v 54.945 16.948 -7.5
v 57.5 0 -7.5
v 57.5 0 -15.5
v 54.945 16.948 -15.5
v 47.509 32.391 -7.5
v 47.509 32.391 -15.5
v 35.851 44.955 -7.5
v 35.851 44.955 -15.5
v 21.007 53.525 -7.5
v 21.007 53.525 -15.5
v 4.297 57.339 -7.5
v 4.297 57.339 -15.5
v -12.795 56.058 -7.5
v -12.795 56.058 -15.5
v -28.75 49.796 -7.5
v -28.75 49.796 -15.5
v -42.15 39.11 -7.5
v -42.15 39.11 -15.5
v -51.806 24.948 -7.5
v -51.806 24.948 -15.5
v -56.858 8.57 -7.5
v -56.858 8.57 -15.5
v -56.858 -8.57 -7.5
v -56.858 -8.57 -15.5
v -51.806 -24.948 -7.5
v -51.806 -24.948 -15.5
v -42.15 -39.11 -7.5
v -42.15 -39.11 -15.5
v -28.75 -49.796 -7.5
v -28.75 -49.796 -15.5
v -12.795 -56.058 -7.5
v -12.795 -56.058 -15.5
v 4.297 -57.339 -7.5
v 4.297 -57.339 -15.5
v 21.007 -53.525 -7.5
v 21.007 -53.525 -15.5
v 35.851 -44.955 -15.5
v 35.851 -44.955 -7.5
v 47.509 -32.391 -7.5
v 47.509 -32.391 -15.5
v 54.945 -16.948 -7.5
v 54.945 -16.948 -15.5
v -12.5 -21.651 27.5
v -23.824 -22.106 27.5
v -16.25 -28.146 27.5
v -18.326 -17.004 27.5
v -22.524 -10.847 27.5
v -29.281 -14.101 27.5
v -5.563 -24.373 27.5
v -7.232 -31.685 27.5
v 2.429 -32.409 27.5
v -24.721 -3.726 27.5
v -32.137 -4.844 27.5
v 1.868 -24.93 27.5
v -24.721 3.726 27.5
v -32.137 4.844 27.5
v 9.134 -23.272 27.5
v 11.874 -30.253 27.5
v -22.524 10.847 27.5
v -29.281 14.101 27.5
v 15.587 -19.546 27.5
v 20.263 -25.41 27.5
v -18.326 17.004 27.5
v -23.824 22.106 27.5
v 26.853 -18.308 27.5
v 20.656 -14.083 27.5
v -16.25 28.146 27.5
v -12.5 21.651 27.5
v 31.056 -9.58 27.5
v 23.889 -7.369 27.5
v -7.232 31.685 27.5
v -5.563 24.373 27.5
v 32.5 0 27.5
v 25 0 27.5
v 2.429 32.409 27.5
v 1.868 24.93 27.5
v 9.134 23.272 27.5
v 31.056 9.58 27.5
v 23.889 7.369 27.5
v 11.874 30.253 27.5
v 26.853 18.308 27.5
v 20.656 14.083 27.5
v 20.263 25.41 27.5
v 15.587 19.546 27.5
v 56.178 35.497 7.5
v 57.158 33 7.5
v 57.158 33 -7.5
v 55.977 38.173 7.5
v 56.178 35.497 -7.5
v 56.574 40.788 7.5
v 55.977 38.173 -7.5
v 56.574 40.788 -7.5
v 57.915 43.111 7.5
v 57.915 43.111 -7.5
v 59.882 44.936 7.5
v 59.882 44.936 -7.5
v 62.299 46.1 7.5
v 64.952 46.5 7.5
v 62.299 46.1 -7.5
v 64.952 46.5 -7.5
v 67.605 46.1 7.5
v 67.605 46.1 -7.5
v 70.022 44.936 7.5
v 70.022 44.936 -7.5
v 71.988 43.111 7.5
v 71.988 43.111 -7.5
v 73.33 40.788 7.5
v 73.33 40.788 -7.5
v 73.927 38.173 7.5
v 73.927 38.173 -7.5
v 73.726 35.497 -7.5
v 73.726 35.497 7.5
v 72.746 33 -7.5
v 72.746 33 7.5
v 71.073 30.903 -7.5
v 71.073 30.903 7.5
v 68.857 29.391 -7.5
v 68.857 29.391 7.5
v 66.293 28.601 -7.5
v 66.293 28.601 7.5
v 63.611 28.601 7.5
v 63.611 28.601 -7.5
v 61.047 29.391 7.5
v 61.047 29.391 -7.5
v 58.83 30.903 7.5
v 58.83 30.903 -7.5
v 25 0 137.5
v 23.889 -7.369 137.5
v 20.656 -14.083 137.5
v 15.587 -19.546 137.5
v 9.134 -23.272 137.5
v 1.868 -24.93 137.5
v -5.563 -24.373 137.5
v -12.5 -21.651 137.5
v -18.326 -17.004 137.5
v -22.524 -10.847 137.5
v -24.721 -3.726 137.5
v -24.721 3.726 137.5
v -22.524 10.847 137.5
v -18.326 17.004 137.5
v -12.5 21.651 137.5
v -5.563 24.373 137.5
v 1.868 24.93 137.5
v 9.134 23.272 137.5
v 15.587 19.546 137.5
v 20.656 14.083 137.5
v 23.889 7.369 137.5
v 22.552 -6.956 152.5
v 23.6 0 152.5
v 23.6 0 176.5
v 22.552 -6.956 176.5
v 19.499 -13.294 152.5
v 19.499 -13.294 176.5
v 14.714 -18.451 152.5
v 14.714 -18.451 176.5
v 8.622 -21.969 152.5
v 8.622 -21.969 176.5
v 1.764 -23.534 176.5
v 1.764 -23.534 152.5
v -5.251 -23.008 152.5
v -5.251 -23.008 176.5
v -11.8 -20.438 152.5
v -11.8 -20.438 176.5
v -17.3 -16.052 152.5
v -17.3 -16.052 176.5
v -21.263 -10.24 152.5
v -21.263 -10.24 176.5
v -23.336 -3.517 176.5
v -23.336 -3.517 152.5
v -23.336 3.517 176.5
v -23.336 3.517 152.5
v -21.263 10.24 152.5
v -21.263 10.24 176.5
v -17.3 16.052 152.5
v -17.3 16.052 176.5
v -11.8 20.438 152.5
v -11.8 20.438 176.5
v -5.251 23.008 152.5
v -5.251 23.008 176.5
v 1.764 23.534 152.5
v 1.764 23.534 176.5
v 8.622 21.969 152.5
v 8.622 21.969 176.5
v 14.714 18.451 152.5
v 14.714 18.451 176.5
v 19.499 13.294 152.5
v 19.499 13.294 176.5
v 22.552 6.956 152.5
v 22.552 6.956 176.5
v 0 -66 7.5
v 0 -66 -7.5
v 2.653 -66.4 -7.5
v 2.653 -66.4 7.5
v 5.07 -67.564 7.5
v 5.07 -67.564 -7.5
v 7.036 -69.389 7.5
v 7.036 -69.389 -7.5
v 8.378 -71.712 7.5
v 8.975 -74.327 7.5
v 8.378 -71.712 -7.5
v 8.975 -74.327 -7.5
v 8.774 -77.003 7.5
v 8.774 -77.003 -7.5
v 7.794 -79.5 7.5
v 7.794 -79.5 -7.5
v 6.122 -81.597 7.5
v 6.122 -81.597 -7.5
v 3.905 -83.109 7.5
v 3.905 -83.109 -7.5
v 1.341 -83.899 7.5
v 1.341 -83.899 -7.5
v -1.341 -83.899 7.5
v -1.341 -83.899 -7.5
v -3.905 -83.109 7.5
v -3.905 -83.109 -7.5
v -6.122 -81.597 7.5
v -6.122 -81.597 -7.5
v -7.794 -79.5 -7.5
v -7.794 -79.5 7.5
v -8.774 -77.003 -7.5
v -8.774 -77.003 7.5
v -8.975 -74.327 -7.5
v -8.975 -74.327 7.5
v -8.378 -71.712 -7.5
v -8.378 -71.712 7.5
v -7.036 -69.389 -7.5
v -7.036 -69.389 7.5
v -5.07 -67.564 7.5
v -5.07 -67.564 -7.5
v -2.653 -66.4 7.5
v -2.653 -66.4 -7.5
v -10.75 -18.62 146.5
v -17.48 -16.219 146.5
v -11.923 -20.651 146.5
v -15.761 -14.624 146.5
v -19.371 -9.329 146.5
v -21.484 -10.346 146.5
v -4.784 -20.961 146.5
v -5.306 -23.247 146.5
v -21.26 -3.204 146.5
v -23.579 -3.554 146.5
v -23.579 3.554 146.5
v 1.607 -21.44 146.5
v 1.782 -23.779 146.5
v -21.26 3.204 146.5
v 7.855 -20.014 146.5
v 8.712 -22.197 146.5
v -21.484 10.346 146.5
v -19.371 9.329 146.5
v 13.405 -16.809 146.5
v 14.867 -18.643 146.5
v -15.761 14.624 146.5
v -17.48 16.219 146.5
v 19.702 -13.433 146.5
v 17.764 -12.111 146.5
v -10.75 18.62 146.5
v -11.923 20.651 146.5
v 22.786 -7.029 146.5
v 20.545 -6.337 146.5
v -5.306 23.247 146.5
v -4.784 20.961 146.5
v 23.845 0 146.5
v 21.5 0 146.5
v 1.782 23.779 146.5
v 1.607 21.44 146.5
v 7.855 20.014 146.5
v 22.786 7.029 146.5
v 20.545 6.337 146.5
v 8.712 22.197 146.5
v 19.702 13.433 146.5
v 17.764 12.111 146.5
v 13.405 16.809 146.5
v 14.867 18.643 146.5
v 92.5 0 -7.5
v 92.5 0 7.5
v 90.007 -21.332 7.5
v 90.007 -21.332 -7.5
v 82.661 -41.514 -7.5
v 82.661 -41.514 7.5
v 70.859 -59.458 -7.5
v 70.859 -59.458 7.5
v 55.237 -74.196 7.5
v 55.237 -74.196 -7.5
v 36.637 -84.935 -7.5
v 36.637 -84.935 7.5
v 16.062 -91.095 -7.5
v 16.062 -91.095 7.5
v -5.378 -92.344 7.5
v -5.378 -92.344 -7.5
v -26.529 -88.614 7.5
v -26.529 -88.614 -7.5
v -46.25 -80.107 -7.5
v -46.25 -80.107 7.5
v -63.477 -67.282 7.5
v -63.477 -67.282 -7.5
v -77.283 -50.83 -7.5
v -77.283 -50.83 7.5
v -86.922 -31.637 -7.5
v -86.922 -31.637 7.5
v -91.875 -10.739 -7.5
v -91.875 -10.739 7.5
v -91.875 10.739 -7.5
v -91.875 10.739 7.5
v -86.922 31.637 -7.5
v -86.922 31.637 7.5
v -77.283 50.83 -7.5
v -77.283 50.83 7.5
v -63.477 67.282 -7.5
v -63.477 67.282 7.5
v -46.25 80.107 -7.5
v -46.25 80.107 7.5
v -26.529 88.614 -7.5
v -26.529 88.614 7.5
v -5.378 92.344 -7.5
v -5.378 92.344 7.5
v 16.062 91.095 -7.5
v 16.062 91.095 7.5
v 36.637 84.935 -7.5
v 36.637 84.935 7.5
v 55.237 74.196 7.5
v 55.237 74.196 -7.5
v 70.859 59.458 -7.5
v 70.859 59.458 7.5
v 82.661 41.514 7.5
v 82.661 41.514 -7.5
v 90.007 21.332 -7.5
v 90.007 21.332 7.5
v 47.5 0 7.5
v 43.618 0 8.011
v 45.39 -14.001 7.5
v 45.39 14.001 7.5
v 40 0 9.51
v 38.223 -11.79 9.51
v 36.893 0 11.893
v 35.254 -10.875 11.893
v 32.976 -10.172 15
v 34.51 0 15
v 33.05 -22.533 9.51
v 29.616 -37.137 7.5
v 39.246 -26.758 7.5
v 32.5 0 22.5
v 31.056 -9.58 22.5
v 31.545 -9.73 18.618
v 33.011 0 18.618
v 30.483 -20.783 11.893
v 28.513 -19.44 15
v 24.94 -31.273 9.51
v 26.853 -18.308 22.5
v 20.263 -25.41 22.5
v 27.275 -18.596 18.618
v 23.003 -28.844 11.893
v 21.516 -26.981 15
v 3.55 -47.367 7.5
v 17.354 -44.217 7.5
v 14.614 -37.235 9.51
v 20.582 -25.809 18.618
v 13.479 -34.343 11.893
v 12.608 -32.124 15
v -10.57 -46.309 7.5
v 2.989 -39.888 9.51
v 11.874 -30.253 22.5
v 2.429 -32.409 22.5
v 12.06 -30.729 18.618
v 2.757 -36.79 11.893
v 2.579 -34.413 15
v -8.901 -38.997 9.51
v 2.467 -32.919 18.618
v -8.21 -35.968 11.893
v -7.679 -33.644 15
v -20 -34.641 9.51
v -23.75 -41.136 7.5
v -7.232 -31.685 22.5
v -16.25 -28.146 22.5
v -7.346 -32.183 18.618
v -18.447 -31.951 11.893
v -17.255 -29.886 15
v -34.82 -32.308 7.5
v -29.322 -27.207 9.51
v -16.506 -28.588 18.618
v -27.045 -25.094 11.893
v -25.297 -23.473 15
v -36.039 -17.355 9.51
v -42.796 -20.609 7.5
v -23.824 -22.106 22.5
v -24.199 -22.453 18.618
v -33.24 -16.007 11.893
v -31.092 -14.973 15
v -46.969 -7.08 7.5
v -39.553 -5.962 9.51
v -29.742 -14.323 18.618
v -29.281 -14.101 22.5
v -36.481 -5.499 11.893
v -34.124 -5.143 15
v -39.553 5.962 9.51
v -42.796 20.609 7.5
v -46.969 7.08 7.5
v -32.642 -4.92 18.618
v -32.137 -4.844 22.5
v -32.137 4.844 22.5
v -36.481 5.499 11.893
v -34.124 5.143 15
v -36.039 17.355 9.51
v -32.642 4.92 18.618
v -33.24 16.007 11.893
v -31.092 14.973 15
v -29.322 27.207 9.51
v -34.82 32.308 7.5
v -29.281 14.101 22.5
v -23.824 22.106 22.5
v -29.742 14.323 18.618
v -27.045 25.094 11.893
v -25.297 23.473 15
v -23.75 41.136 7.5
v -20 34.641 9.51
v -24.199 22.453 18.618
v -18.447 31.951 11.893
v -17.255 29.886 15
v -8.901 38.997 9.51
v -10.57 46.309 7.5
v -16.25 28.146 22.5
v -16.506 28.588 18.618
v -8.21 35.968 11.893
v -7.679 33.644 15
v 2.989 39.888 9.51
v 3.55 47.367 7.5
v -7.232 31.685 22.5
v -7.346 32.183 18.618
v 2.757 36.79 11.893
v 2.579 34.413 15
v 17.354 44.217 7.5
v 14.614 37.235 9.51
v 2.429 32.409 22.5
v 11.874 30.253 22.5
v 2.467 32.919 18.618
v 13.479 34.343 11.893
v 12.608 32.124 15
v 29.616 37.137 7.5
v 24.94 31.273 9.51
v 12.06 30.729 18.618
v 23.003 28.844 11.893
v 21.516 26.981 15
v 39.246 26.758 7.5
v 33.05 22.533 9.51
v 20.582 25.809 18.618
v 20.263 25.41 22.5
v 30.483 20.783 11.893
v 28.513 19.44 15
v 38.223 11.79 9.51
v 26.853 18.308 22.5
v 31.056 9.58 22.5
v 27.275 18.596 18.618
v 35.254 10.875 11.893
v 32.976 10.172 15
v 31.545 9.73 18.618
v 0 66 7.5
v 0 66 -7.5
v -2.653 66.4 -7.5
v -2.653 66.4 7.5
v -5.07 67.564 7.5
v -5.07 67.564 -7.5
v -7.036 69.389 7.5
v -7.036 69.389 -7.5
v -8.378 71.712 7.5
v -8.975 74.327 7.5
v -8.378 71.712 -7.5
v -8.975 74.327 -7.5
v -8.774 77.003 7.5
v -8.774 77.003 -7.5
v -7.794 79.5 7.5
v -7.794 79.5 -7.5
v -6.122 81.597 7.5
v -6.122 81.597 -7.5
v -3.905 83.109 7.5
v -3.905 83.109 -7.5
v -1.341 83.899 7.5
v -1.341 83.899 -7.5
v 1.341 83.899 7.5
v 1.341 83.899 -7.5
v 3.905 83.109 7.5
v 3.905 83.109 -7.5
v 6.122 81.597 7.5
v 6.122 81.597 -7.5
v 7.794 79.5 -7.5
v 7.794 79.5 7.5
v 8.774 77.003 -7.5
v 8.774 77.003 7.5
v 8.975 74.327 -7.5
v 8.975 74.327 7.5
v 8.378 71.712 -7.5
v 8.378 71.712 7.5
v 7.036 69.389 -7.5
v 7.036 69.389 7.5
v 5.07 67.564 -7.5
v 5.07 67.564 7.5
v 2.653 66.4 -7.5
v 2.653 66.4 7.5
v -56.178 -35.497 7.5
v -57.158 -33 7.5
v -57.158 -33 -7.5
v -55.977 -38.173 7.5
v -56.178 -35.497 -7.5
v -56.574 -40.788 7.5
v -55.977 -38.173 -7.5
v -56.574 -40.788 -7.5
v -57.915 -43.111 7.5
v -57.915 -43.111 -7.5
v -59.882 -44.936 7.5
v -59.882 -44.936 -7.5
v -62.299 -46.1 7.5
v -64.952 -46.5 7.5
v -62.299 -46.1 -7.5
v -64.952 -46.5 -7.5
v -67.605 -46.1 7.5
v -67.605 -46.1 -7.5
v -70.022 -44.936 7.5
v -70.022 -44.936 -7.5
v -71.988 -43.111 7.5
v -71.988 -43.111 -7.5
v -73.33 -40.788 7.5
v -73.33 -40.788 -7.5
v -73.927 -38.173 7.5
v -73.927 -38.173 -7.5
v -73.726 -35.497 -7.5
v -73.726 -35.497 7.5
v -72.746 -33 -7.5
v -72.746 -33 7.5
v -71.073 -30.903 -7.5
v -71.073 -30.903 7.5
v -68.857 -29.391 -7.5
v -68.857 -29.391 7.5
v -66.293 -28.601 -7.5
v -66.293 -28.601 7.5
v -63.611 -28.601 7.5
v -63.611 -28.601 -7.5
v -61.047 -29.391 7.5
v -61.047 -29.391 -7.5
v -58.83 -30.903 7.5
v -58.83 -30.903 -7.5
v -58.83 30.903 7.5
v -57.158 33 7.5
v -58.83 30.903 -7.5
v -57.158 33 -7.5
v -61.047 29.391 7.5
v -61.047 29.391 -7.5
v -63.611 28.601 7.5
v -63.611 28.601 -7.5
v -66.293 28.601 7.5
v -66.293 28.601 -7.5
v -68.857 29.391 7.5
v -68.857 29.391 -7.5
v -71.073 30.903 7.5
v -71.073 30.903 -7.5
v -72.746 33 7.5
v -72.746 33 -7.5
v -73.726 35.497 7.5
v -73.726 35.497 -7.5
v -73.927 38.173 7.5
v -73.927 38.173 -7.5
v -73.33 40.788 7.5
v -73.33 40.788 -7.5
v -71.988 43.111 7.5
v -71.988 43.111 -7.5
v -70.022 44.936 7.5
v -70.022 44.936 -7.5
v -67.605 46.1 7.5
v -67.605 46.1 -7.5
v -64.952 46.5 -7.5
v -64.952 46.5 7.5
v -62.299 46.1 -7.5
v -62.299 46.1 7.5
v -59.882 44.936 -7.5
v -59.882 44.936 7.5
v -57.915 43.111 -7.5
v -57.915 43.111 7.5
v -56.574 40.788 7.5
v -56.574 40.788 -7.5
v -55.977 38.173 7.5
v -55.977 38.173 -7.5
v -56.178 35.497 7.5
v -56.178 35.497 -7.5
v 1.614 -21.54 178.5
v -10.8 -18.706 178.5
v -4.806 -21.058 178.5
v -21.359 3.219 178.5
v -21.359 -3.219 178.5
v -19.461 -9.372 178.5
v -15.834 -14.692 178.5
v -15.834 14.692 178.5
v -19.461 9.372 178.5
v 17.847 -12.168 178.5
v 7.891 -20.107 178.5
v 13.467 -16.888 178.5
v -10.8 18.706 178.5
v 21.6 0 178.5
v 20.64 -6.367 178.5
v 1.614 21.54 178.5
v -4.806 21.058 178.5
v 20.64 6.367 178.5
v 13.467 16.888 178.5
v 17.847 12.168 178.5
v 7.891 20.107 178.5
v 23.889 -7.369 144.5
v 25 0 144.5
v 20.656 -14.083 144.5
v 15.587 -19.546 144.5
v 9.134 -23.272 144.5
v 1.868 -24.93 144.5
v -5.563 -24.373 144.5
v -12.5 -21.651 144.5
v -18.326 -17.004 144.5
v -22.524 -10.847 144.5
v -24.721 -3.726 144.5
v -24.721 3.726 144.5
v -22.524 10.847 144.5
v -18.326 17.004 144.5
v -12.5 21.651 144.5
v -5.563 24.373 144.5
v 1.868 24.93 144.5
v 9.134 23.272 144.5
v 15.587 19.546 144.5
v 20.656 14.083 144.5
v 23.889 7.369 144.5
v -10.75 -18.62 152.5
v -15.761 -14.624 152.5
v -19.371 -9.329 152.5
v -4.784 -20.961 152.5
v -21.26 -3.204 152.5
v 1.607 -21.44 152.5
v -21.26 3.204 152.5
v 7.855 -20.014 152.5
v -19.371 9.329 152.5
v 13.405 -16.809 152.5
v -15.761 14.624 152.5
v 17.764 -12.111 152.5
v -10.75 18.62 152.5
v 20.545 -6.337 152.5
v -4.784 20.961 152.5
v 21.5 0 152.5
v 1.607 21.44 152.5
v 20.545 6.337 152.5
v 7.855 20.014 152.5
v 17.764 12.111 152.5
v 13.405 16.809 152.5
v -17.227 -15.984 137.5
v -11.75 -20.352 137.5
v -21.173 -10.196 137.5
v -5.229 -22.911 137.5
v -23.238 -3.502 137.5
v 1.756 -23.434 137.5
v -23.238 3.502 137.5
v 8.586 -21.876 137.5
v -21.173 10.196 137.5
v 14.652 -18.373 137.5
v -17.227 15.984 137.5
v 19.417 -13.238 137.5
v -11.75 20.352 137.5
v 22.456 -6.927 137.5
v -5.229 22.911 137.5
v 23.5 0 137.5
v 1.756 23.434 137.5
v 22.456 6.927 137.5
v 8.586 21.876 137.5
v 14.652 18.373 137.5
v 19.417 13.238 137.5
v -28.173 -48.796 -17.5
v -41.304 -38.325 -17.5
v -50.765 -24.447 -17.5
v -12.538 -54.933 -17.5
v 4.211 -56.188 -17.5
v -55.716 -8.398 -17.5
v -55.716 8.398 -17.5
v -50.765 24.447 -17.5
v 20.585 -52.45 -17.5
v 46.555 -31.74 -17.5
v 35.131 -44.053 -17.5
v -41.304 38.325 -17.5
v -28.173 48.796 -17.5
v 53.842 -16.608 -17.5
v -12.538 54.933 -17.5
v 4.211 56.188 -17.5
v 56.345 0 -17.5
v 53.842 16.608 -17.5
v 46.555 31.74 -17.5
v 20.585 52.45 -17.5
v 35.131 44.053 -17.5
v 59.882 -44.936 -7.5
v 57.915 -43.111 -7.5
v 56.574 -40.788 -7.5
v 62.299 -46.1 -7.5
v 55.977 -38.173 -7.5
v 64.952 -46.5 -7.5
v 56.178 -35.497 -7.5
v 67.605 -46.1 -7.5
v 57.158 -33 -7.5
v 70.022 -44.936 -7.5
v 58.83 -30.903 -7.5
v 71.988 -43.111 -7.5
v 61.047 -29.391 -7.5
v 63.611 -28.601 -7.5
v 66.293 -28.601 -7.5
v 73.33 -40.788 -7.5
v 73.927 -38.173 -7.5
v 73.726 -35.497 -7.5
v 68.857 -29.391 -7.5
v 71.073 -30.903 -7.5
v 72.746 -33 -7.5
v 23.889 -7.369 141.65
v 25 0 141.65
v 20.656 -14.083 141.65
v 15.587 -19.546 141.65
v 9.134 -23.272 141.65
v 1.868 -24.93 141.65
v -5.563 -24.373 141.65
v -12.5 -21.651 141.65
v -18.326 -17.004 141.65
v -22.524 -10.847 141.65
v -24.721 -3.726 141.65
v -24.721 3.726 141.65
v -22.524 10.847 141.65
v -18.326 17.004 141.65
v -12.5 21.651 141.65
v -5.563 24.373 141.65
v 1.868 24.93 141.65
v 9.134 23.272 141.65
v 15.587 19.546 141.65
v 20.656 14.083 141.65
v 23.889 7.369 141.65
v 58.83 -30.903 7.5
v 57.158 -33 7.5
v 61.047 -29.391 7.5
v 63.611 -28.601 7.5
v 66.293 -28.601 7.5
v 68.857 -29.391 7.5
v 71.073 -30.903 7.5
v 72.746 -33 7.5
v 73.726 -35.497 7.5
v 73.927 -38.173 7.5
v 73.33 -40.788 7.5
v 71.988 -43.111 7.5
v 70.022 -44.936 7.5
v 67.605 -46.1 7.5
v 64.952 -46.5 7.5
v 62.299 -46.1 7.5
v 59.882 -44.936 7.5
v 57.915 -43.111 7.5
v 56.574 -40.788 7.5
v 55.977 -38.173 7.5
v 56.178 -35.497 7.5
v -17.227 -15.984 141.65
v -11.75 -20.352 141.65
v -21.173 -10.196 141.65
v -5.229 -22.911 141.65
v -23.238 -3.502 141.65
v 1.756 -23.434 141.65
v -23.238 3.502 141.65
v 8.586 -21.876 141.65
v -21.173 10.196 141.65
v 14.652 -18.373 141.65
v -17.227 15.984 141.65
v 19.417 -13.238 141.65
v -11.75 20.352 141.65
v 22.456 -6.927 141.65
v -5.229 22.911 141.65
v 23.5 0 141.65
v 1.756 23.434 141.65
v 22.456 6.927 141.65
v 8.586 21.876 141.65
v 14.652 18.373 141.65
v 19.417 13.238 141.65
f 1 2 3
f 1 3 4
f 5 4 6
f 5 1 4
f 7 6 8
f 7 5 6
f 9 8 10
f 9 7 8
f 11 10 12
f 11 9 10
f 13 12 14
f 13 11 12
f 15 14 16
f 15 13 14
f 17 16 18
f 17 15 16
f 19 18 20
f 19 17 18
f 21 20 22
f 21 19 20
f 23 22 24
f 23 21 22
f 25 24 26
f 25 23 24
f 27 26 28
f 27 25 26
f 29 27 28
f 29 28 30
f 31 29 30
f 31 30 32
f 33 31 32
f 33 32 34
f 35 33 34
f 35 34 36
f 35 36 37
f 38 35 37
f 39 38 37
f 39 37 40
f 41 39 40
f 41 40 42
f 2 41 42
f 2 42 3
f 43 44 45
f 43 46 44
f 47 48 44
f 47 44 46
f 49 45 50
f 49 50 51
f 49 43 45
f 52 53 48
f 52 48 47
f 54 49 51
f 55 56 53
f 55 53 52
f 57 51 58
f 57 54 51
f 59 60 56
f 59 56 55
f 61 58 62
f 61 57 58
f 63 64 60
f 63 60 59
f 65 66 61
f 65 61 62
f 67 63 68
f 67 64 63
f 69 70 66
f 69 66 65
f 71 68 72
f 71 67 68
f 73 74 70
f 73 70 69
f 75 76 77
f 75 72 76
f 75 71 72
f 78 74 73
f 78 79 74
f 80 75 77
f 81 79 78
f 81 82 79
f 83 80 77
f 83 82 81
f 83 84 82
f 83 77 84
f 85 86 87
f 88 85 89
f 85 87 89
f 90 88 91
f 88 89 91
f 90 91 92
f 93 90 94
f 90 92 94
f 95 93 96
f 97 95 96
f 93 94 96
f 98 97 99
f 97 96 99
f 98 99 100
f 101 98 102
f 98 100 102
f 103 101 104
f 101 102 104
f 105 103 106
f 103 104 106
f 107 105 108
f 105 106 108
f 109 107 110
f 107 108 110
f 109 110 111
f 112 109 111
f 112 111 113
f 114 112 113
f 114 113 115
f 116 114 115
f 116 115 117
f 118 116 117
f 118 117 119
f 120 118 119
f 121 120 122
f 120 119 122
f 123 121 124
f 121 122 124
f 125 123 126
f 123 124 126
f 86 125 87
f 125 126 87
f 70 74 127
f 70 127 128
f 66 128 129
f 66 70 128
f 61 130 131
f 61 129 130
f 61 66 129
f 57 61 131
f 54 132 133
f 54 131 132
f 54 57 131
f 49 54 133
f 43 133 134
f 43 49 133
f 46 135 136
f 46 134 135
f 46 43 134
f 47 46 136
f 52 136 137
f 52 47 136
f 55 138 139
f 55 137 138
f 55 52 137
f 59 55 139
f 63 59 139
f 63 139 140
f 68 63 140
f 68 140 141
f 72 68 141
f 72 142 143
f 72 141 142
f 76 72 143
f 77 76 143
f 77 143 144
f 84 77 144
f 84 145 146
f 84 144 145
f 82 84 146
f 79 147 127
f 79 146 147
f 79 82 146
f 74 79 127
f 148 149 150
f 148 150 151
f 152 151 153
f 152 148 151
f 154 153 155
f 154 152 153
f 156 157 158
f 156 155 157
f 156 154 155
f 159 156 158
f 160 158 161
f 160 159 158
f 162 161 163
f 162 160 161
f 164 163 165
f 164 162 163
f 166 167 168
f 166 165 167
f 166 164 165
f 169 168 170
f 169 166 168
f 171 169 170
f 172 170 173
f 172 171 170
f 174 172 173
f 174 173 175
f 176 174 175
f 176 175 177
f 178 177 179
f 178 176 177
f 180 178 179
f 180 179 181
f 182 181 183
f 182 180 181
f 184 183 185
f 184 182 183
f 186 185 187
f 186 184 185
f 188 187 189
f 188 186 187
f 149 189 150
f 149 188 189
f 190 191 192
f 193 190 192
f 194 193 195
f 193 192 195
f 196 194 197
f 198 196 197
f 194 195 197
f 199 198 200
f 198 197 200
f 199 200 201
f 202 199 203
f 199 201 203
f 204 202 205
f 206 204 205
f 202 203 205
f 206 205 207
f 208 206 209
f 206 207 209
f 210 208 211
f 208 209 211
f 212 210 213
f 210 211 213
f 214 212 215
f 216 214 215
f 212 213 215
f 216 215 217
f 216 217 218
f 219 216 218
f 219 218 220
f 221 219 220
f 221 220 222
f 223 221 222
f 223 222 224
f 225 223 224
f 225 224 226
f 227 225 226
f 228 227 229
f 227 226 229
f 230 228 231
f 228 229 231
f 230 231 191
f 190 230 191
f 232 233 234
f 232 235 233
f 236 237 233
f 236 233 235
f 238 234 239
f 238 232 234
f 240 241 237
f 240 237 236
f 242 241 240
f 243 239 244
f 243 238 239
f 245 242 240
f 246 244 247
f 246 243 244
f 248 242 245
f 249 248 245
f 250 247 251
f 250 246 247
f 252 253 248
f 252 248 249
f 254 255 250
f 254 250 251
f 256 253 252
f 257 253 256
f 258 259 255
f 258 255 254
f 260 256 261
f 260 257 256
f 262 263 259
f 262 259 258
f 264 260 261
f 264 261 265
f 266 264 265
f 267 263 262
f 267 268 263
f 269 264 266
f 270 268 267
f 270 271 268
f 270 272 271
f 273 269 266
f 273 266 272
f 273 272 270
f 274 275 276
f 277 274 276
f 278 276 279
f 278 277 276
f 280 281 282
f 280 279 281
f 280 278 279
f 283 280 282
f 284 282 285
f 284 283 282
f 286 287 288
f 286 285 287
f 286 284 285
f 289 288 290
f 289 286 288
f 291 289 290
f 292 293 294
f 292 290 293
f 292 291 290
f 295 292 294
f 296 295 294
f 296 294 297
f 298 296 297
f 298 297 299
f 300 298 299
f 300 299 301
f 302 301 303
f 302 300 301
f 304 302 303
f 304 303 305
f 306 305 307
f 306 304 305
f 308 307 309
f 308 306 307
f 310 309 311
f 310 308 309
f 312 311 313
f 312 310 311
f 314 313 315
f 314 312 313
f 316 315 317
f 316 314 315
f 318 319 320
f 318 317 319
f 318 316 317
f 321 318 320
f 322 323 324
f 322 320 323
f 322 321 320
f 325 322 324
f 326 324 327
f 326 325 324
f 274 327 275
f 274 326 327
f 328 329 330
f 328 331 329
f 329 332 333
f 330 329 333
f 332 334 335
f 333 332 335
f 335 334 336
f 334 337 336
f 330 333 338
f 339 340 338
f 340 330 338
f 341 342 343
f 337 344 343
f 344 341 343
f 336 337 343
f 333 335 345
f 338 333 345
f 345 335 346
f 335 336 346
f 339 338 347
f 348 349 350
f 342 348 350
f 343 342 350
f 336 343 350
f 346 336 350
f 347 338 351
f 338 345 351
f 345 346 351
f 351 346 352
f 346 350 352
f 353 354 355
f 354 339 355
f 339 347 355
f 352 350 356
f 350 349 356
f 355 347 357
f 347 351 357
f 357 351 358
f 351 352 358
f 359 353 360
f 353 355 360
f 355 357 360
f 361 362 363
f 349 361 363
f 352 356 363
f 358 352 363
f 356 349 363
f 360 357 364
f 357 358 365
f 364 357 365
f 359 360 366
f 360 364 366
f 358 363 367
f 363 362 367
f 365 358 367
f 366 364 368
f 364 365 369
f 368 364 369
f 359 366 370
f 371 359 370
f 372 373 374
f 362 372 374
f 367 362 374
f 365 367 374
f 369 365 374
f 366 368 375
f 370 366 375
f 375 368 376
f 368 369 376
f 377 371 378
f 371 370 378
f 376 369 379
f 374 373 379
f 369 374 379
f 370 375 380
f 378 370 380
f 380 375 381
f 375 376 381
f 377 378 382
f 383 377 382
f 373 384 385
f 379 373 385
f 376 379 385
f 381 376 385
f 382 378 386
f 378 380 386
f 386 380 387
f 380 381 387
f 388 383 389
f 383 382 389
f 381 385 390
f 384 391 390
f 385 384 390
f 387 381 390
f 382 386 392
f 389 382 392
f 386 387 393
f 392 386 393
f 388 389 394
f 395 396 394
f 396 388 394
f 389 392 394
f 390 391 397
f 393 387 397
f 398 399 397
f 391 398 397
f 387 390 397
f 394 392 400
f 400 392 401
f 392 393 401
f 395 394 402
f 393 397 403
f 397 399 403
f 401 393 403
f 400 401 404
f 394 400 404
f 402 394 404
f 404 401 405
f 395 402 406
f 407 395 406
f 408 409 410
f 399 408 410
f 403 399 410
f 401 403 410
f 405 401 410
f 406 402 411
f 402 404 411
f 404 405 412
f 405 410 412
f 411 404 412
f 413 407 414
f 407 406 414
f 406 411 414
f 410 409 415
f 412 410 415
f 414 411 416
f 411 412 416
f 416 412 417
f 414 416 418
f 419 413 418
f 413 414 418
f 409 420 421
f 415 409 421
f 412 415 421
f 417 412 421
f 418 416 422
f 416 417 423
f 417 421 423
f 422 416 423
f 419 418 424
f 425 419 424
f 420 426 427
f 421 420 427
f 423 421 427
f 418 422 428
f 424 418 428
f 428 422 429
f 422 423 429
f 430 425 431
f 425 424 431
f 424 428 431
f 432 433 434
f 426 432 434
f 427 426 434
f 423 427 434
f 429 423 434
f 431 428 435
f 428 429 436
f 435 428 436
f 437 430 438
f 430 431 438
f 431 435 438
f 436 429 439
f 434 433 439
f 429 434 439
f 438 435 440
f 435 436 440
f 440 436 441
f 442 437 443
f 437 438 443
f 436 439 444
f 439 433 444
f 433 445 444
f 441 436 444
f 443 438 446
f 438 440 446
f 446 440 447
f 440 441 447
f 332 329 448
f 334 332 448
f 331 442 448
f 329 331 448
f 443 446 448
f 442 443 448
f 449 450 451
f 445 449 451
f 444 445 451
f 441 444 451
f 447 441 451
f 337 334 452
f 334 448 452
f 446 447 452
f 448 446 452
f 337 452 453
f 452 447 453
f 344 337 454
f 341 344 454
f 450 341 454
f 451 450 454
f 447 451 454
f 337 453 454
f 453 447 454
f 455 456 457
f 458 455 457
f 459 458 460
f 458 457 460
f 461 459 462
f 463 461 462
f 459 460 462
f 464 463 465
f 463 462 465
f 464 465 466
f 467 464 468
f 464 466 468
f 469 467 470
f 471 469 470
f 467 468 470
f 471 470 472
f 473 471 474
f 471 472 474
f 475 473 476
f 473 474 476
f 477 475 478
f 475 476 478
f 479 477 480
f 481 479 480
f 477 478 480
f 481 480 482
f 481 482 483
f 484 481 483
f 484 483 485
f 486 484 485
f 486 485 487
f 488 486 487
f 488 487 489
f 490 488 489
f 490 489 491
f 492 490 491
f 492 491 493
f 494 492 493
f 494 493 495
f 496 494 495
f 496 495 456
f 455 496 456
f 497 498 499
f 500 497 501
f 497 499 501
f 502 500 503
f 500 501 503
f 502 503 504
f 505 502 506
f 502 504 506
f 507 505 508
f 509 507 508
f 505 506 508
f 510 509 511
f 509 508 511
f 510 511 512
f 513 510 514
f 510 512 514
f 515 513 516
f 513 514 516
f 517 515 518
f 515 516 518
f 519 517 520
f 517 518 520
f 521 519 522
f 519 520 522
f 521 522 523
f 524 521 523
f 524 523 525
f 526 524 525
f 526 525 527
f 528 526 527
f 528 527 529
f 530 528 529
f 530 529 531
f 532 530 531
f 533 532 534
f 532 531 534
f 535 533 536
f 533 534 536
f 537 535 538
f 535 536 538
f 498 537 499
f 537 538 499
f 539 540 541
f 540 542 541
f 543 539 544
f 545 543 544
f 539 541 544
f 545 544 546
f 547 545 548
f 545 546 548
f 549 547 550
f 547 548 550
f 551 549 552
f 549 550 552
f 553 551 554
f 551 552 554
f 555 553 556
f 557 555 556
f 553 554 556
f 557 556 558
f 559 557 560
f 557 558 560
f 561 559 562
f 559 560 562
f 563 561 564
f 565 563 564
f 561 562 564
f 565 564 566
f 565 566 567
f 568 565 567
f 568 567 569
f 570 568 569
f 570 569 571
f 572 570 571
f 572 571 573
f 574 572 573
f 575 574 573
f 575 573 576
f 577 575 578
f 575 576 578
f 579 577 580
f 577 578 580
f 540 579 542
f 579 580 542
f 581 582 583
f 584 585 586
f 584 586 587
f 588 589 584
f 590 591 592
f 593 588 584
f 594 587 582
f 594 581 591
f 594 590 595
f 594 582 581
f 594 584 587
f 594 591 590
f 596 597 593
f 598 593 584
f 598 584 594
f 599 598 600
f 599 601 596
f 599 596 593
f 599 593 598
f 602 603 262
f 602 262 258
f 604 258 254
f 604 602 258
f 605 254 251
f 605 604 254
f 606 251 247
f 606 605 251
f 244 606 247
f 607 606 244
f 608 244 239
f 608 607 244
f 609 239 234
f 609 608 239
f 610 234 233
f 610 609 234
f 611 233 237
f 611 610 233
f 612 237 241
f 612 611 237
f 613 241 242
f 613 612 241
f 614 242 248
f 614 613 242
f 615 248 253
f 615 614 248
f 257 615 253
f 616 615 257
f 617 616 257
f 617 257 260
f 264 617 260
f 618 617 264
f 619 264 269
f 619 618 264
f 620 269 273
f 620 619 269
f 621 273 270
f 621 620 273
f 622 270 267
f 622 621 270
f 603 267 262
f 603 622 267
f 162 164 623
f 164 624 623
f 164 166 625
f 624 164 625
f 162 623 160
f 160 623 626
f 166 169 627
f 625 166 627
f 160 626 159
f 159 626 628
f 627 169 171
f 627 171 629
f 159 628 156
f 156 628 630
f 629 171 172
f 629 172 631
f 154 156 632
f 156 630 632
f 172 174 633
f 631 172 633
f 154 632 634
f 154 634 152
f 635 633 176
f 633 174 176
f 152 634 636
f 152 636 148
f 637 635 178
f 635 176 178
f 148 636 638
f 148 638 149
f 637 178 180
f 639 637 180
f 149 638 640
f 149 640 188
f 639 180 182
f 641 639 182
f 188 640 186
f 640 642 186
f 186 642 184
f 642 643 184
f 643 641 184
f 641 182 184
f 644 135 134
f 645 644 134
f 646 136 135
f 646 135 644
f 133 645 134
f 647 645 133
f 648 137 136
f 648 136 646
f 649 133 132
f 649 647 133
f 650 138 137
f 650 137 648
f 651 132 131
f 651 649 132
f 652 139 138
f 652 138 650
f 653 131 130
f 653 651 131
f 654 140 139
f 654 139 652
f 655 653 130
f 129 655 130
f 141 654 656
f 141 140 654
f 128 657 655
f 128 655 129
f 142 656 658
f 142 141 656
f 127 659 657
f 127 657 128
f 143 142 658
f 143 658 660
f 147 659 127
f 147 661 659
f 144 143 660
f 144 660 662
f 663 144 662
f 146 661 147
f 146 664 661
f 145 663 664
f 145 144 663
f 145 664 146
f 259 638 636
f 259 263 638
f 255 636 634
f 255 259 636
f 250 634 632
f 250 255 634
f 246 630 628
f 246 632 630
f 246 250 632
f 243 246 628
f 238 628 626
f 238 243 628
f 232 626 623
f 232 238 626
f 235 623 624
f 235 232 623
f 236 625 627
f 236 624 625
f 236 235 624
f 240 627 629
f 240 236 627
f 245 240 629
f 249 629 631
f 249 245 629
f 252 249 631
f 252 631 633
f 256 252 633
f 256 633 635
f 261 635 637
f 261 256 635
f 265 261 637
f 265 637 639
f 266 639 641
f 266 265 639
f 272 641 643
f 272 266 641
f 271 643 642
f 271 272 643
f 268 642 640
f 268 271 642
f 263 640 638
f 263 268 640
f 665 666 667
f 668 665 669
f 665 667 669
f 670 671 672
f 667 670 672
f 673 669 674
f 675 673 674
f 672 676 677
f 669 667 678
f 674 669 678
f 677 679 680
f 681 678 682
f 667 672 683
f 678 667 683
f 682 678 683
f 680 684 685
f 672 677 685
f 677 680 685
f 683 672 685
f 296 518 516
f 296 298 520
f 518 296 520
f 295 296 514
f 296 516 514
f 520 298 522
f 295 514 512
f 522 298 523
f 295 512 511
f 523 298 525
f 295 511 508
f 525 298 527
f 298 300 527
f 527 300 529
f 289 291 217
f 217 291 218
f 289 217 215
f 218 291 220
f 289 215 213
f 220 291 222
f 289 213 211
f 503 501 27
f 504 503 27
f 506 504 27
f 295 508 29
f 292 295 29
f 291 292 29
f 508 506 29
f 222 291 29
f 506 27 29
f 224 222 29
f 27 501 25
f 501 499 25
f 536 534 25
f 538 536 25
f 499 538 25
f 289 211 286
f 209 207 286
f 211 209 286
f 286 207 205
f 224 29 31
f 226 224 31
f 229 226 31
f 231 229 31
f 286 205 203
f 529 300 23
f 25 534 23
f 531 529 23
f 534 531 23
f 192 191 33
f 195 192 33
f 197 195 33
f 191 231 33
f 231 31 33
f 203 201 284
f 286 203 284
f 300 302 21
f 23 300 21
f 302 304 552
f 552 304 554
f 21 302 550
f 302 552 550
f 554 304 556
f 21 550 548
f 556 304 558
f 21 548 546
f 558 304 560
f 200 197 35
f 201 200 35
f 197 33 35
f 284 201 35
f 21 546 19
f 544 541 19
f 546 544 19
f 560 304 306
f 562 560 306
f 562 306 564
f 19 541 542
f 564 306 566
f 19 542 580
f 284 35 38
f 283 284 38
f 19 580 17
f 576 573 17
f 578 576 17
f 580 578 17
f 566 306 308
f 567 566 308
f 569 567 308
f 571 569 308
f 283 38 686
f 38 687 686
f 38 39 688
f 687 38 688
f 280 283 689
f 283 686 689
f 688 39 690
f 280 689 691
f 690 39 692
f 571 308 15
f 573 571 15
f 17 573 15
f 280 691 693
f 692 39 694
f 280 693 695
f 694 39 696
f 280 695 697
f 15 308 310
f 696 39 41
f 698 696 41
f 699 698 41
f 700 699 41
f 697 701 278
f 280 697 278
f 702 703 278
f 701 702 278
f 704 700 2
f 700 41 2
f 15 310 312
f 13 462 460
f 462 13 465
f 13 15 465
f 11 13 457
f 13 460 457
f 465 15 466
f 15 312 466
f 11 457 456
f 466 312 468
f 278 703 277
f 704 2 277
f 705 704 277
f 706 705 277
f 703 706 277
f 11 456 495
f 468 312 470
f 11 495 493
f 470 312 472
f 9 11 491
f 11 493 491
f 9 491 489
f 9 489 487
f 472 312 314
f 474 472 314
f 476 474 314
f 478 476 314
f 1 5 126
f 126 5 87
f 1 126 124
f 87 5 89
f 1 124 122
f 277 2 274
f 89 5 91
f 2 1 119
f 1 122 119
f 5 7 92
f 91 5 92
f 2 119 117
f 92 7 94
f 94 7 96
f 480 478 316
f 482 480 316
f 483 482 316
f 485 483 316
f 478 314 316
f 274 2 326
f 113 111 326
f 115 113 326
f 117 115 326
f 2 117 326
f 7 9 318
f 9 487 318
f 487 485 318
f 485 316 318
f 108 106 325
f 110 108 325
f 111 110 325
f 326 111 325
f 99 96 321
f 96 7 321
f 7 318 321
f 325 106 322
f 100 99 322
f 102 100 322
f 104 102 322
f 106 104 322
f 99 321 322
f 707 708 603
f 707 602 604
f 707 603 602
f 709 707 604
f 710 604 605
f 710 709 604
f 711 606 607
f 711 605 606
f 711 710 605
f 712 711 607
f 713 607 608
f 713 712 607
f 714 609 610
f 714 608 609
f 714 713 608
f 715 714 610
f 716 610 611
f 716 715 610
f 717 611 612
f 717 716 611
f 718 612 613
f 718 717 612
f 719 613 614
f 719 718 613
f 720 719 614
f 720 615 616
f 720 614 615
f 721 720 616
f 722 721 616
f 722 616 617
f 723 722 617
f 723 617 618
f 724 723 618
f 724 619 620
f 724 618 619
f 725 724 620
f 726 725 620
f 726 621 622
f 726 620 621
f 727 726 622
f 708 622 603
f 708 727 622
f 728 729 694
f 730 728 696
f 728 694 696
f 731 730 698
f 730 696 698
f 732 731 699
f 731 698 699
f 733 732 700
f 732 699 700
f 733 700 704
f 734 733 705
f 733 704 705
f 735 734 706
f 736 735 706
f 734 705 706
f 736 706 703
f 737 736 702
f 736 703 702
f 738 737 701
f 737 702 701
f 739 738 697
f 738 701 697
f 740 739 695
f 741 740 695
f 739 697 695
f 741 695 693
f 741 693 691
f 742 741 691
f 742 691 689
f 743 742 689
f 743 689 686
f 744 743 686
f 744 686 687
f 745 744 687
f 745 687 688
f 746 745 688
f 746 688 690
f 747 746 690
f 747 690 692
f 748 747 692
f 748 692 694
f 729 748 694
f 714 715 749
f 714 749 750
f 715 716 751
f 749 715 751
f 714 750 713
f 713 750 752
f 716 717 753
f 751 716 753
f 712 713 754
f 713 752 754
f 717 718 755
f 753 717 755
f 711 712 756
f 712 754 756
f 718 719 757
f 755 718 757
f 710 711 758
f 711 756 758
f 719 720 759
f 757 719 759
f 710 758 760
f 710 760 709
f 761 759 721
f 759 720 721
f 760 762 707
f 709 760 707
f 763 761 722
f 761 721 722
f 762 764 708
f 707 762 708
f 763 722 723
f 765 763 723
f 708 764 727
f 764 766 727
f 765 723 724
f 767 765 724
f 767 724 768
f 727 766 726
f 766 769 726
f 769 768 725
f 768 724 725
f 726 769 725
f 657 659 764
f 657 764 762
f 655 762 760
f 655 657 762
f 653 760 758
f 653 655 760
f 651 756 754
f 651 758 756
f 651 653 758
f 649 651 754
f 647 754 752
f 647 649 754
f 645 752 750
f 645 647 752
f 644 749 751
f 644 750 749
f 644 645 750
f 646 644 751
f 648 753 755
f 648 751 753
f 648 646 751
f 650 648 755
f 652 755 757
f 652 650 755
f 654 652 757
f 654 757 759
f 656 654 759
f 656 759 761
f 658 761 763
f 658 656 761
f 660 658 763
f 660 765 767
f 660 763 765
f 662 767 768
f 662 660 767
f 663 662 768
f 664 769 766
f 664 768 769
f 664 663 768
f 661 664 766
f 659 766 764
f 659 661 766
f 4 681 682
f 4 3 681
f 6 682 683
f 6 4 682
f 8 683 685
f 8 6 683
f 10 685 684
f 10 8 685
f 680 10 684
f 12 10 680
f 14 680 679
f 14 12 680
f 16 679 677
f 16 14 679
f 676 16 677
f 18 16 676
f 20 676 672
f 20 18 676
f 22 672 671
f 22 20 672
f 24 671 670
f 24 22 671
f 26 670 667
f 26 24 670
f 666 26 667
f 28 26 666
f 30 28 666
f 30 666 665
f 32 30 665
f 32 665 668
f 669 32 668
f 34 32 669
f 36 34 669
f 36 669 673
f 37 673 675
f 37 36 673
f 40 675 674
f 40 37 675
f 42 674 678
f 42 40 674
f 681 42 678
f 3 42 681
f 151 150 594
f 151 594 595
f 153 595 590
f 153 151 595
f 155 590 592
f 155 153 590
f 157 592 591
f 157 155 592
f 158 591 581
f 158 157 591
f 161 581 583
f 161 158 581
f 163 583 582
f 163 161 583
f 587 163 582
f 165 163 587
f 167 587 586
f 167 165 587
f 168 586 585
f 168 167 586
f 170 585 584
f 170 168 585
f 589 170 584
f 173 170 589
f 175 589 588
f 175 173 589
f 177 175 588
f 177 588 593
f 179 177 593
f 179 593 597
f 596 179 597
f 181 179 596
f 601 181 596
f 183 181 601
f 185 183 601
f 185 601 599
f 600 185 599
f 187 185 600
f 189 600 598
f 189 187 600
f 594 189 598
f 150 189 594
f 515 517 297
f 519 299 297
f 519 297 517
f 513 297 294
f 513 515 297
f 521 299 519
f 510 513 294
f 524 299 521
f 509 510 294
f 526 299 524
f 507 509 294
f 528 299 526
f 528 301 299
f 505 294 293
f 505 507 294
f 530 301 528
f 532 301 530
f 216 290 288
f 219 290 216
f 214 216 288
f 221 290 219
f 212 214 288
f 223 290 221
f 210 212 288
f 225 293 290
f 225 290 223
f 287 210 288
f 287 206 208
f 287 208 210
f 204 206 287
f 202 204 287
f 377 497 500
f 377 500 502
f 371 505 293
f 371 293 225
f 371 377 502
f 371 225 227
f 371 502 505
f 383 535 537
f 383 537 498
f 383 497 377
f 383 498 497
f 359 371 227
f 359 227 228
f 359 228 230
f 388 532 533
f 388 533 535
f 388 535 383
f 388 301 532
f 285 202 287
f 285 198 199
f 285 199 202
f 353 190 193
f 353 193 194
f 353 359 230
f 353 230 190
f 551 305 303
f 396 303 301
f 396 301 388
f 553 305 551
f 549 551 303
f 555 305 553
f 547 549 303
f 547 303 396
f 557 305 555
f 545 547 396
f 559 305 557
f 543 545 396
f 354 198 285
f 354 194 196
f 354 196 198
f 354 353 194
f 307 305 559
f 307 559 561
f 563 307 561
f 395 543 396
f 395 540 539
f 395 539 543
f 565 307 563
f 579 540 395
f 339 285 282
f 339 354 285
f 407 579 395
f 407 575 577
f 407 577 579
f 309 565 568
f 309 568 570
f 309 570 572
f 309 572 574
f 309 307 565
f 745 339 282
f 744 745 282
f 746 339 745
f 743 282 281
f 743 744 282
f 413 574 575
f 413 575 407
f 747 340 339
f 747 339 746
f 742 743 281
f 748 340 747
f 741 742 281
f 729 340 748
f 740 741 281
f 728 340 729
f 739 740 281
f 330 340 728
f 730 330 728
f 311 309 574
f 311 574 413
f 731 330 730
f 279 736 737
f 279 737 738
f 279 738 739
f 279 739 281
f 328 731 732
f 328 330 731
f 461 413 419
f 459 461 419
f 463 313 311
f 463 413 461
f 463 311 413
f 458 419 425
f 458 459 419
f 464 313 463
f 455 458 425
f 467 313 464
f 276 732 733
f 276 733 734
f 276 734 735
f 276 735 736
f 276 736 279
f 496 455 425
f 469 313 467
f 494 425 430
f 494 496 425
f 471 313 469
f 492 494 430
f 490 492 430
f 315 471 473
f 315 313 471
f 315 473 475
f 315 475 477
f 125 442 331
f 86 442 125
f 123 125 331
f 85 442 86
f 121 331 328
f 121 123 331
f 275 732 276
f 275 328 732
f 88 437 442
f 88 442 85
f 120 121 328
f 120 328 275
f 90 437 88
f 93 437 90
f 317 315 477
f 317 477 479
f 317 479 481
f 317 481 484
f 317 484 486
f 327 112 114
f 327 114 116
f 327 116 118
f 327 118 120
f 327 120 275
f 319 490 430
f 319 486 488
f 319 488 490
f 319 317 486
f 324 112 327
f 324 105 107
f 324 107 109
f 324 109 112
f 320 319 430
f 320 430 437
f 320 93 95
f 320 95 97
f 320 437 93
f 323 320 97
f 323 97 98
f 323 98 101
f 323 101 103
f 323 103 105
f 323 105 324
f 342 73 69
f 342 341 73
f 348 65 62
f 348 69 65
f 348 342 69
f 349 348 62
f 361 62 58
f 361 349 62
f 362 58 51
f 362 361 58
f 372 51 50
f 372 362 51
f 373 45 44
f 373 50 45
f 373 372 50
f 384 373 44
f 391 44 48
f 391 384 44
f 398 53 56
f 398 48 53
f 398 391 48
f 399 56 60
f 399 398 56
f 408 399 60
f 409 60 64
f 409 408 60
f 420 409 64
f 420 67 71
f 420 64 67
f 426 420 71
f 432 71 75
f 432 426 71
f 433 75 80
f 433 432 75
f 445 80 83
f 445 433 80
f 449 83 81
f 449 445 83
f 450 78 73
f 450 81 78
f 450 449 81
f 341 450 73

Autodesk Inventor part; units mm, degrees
ref_plane "YZ Plane" through (0, 0, 0) normal (1, 0, 0) x (0, 1, 0)
ref_plane "XZ Plane" through (0, 0, 0) normal (0, 1, 0) x (-1, 0, 0)
ref_plane "XY Plane" through (0, 0, 0) normal (0, 0, 1) x (1, 0, 0)
sketch "Sketch1" plane through (-207.0981, -171.1026, -7.5) normal (0, 0, 1) x (1, 0, 0)
  circle A0 centre (207.0981, 171.1026) radius 92.5
  dimension "d40" = 185
extrude "ExtrusionBlind1" add sketch "Sketch1" along normal blind 15
sketch "Sketch2" plane through (-207.0981, -171.1026, -7.5) normal (0, 0, 1) x (1, 0, 0)
  circle A0 centre (207.0981, 171.1026) radius 57.5
  circle A1 centre (207.0981, 171.1026) radius 92.5 projected
  dimension "d41" = 115
extrude "ExtrusionBlind2" add sketch "Sketch2" against normal blind 10 contours A0
chamfer "Chamfer1" distance 2 angle 30 1 edges at (-57.5, 0, -17.5) measured on face at (-40.0277, -41.2799, -14.1667)
sketch "Sketch4" plane through (0, 0, 7.5) normal (0, 0, 1) x (1, 0, 0)
  circle A0 centre (0, 0) radius 32.5
  circle A1 centre (0, 0) radius 92.5 projected
  dimension "d42" = 65
extrude "ExtrusionBlind3" add sketch "Sketch4" along normal blind 20 contours A0
fillet "Fillet1" radius 15 1 edges at (-32.5, 0, 7.5)
sketch "Sketch5" plane through (0, 0, 27.5) normal (0, 0, 1) x (1, 0, 0)
  circle A0 centre (0, 0) radius 25
  circle A1 centre (0, 0) radius 32.5 projected
  dimension "d43" = 50
extrude "ExtrusionBlind4" add sketch "Sketch5" along normal blind 110 contours A0
sketch "Sketch6" plane through (0, 0, 137.5) normal (0, 0, 1) x (1, 0, 0)
  circle A0 centre (0, 0) radius 23.5
  circle A1 centre (0, 0) radius 25 projected
  dimension "d44" = 47
extrude "ExtrusionBlind5" add sketch "Sketch6" along normal blind 4.15 contours A0
sketch "Sketch7" plane through (0, 0, 141.65) normal (0, 0, 1) x (1, 0, 0)
  circle A0 centre (0, 0) radius 25
  circle A1 centre (0, 0) radius 23.5 projected
  dimension "d45" = 50
extrude "ExtrusionBlind6" add sketch "Sketch7" along normal blind 4.85 contours A0 | A1
chamfer "Chamfer2" distance 2 angle 30 1 edges at (-25, 0, 146.5) measured on face at (24.9189, -2.0117, 144.8833)
sketch "Sketch8" plane through (0, 0, 146.5) normal (0, 0, 1) x (1, 0, 0)
  circle A0 centre (0, 0) radius 21.5
  circle A1 centre (0, 0) radius 23.8453 projected
  dimension "d46" = 43
extrude "ExtrusionBlind7" add sketch "Sketch8" along normal blind 6 contours A0
sketch "Sketch9" plane through (0, 0, 152.5) normal (0, 0, 1) x (1, 0, 0)
  circle A0 centre (0, 0) radius 23.6
  circle A1 centre (0, 0) radius 21.5 projected
  dimension "d47" = 47.2
extrude "ExtrusionBlind8" add sketch "Sketch9" along normal blind 26 contours A0 | A1
chamfer "Chamfer3" distance 2 angle 45 1 edges at (-23.6, 0, 178.5)
sketch "Sketch12" plane through (0, 0, 7.5) normal (0, 0, 1) x (1, 0, 0)
  circle A0 centre (0, 0) radius 92.5 projected
  line L0 (0, 0) -> (0, 75) construction
  dimension "d51" = 75
hole "Hole2" at (0, 75, 7.5) direction (0, 0, -1) diameter 18 end through all clearance for "Hex Head Bolt" size "M16" standard "Ansi Metric M Profile"
pattern_circular "Circular Pattern2" count 6 over 360 about axis through (0, 0, -7.5) along (0, 0, 1) of "Hole2"
properties part number "7055-191 PART1" material "Steel, Mild"
